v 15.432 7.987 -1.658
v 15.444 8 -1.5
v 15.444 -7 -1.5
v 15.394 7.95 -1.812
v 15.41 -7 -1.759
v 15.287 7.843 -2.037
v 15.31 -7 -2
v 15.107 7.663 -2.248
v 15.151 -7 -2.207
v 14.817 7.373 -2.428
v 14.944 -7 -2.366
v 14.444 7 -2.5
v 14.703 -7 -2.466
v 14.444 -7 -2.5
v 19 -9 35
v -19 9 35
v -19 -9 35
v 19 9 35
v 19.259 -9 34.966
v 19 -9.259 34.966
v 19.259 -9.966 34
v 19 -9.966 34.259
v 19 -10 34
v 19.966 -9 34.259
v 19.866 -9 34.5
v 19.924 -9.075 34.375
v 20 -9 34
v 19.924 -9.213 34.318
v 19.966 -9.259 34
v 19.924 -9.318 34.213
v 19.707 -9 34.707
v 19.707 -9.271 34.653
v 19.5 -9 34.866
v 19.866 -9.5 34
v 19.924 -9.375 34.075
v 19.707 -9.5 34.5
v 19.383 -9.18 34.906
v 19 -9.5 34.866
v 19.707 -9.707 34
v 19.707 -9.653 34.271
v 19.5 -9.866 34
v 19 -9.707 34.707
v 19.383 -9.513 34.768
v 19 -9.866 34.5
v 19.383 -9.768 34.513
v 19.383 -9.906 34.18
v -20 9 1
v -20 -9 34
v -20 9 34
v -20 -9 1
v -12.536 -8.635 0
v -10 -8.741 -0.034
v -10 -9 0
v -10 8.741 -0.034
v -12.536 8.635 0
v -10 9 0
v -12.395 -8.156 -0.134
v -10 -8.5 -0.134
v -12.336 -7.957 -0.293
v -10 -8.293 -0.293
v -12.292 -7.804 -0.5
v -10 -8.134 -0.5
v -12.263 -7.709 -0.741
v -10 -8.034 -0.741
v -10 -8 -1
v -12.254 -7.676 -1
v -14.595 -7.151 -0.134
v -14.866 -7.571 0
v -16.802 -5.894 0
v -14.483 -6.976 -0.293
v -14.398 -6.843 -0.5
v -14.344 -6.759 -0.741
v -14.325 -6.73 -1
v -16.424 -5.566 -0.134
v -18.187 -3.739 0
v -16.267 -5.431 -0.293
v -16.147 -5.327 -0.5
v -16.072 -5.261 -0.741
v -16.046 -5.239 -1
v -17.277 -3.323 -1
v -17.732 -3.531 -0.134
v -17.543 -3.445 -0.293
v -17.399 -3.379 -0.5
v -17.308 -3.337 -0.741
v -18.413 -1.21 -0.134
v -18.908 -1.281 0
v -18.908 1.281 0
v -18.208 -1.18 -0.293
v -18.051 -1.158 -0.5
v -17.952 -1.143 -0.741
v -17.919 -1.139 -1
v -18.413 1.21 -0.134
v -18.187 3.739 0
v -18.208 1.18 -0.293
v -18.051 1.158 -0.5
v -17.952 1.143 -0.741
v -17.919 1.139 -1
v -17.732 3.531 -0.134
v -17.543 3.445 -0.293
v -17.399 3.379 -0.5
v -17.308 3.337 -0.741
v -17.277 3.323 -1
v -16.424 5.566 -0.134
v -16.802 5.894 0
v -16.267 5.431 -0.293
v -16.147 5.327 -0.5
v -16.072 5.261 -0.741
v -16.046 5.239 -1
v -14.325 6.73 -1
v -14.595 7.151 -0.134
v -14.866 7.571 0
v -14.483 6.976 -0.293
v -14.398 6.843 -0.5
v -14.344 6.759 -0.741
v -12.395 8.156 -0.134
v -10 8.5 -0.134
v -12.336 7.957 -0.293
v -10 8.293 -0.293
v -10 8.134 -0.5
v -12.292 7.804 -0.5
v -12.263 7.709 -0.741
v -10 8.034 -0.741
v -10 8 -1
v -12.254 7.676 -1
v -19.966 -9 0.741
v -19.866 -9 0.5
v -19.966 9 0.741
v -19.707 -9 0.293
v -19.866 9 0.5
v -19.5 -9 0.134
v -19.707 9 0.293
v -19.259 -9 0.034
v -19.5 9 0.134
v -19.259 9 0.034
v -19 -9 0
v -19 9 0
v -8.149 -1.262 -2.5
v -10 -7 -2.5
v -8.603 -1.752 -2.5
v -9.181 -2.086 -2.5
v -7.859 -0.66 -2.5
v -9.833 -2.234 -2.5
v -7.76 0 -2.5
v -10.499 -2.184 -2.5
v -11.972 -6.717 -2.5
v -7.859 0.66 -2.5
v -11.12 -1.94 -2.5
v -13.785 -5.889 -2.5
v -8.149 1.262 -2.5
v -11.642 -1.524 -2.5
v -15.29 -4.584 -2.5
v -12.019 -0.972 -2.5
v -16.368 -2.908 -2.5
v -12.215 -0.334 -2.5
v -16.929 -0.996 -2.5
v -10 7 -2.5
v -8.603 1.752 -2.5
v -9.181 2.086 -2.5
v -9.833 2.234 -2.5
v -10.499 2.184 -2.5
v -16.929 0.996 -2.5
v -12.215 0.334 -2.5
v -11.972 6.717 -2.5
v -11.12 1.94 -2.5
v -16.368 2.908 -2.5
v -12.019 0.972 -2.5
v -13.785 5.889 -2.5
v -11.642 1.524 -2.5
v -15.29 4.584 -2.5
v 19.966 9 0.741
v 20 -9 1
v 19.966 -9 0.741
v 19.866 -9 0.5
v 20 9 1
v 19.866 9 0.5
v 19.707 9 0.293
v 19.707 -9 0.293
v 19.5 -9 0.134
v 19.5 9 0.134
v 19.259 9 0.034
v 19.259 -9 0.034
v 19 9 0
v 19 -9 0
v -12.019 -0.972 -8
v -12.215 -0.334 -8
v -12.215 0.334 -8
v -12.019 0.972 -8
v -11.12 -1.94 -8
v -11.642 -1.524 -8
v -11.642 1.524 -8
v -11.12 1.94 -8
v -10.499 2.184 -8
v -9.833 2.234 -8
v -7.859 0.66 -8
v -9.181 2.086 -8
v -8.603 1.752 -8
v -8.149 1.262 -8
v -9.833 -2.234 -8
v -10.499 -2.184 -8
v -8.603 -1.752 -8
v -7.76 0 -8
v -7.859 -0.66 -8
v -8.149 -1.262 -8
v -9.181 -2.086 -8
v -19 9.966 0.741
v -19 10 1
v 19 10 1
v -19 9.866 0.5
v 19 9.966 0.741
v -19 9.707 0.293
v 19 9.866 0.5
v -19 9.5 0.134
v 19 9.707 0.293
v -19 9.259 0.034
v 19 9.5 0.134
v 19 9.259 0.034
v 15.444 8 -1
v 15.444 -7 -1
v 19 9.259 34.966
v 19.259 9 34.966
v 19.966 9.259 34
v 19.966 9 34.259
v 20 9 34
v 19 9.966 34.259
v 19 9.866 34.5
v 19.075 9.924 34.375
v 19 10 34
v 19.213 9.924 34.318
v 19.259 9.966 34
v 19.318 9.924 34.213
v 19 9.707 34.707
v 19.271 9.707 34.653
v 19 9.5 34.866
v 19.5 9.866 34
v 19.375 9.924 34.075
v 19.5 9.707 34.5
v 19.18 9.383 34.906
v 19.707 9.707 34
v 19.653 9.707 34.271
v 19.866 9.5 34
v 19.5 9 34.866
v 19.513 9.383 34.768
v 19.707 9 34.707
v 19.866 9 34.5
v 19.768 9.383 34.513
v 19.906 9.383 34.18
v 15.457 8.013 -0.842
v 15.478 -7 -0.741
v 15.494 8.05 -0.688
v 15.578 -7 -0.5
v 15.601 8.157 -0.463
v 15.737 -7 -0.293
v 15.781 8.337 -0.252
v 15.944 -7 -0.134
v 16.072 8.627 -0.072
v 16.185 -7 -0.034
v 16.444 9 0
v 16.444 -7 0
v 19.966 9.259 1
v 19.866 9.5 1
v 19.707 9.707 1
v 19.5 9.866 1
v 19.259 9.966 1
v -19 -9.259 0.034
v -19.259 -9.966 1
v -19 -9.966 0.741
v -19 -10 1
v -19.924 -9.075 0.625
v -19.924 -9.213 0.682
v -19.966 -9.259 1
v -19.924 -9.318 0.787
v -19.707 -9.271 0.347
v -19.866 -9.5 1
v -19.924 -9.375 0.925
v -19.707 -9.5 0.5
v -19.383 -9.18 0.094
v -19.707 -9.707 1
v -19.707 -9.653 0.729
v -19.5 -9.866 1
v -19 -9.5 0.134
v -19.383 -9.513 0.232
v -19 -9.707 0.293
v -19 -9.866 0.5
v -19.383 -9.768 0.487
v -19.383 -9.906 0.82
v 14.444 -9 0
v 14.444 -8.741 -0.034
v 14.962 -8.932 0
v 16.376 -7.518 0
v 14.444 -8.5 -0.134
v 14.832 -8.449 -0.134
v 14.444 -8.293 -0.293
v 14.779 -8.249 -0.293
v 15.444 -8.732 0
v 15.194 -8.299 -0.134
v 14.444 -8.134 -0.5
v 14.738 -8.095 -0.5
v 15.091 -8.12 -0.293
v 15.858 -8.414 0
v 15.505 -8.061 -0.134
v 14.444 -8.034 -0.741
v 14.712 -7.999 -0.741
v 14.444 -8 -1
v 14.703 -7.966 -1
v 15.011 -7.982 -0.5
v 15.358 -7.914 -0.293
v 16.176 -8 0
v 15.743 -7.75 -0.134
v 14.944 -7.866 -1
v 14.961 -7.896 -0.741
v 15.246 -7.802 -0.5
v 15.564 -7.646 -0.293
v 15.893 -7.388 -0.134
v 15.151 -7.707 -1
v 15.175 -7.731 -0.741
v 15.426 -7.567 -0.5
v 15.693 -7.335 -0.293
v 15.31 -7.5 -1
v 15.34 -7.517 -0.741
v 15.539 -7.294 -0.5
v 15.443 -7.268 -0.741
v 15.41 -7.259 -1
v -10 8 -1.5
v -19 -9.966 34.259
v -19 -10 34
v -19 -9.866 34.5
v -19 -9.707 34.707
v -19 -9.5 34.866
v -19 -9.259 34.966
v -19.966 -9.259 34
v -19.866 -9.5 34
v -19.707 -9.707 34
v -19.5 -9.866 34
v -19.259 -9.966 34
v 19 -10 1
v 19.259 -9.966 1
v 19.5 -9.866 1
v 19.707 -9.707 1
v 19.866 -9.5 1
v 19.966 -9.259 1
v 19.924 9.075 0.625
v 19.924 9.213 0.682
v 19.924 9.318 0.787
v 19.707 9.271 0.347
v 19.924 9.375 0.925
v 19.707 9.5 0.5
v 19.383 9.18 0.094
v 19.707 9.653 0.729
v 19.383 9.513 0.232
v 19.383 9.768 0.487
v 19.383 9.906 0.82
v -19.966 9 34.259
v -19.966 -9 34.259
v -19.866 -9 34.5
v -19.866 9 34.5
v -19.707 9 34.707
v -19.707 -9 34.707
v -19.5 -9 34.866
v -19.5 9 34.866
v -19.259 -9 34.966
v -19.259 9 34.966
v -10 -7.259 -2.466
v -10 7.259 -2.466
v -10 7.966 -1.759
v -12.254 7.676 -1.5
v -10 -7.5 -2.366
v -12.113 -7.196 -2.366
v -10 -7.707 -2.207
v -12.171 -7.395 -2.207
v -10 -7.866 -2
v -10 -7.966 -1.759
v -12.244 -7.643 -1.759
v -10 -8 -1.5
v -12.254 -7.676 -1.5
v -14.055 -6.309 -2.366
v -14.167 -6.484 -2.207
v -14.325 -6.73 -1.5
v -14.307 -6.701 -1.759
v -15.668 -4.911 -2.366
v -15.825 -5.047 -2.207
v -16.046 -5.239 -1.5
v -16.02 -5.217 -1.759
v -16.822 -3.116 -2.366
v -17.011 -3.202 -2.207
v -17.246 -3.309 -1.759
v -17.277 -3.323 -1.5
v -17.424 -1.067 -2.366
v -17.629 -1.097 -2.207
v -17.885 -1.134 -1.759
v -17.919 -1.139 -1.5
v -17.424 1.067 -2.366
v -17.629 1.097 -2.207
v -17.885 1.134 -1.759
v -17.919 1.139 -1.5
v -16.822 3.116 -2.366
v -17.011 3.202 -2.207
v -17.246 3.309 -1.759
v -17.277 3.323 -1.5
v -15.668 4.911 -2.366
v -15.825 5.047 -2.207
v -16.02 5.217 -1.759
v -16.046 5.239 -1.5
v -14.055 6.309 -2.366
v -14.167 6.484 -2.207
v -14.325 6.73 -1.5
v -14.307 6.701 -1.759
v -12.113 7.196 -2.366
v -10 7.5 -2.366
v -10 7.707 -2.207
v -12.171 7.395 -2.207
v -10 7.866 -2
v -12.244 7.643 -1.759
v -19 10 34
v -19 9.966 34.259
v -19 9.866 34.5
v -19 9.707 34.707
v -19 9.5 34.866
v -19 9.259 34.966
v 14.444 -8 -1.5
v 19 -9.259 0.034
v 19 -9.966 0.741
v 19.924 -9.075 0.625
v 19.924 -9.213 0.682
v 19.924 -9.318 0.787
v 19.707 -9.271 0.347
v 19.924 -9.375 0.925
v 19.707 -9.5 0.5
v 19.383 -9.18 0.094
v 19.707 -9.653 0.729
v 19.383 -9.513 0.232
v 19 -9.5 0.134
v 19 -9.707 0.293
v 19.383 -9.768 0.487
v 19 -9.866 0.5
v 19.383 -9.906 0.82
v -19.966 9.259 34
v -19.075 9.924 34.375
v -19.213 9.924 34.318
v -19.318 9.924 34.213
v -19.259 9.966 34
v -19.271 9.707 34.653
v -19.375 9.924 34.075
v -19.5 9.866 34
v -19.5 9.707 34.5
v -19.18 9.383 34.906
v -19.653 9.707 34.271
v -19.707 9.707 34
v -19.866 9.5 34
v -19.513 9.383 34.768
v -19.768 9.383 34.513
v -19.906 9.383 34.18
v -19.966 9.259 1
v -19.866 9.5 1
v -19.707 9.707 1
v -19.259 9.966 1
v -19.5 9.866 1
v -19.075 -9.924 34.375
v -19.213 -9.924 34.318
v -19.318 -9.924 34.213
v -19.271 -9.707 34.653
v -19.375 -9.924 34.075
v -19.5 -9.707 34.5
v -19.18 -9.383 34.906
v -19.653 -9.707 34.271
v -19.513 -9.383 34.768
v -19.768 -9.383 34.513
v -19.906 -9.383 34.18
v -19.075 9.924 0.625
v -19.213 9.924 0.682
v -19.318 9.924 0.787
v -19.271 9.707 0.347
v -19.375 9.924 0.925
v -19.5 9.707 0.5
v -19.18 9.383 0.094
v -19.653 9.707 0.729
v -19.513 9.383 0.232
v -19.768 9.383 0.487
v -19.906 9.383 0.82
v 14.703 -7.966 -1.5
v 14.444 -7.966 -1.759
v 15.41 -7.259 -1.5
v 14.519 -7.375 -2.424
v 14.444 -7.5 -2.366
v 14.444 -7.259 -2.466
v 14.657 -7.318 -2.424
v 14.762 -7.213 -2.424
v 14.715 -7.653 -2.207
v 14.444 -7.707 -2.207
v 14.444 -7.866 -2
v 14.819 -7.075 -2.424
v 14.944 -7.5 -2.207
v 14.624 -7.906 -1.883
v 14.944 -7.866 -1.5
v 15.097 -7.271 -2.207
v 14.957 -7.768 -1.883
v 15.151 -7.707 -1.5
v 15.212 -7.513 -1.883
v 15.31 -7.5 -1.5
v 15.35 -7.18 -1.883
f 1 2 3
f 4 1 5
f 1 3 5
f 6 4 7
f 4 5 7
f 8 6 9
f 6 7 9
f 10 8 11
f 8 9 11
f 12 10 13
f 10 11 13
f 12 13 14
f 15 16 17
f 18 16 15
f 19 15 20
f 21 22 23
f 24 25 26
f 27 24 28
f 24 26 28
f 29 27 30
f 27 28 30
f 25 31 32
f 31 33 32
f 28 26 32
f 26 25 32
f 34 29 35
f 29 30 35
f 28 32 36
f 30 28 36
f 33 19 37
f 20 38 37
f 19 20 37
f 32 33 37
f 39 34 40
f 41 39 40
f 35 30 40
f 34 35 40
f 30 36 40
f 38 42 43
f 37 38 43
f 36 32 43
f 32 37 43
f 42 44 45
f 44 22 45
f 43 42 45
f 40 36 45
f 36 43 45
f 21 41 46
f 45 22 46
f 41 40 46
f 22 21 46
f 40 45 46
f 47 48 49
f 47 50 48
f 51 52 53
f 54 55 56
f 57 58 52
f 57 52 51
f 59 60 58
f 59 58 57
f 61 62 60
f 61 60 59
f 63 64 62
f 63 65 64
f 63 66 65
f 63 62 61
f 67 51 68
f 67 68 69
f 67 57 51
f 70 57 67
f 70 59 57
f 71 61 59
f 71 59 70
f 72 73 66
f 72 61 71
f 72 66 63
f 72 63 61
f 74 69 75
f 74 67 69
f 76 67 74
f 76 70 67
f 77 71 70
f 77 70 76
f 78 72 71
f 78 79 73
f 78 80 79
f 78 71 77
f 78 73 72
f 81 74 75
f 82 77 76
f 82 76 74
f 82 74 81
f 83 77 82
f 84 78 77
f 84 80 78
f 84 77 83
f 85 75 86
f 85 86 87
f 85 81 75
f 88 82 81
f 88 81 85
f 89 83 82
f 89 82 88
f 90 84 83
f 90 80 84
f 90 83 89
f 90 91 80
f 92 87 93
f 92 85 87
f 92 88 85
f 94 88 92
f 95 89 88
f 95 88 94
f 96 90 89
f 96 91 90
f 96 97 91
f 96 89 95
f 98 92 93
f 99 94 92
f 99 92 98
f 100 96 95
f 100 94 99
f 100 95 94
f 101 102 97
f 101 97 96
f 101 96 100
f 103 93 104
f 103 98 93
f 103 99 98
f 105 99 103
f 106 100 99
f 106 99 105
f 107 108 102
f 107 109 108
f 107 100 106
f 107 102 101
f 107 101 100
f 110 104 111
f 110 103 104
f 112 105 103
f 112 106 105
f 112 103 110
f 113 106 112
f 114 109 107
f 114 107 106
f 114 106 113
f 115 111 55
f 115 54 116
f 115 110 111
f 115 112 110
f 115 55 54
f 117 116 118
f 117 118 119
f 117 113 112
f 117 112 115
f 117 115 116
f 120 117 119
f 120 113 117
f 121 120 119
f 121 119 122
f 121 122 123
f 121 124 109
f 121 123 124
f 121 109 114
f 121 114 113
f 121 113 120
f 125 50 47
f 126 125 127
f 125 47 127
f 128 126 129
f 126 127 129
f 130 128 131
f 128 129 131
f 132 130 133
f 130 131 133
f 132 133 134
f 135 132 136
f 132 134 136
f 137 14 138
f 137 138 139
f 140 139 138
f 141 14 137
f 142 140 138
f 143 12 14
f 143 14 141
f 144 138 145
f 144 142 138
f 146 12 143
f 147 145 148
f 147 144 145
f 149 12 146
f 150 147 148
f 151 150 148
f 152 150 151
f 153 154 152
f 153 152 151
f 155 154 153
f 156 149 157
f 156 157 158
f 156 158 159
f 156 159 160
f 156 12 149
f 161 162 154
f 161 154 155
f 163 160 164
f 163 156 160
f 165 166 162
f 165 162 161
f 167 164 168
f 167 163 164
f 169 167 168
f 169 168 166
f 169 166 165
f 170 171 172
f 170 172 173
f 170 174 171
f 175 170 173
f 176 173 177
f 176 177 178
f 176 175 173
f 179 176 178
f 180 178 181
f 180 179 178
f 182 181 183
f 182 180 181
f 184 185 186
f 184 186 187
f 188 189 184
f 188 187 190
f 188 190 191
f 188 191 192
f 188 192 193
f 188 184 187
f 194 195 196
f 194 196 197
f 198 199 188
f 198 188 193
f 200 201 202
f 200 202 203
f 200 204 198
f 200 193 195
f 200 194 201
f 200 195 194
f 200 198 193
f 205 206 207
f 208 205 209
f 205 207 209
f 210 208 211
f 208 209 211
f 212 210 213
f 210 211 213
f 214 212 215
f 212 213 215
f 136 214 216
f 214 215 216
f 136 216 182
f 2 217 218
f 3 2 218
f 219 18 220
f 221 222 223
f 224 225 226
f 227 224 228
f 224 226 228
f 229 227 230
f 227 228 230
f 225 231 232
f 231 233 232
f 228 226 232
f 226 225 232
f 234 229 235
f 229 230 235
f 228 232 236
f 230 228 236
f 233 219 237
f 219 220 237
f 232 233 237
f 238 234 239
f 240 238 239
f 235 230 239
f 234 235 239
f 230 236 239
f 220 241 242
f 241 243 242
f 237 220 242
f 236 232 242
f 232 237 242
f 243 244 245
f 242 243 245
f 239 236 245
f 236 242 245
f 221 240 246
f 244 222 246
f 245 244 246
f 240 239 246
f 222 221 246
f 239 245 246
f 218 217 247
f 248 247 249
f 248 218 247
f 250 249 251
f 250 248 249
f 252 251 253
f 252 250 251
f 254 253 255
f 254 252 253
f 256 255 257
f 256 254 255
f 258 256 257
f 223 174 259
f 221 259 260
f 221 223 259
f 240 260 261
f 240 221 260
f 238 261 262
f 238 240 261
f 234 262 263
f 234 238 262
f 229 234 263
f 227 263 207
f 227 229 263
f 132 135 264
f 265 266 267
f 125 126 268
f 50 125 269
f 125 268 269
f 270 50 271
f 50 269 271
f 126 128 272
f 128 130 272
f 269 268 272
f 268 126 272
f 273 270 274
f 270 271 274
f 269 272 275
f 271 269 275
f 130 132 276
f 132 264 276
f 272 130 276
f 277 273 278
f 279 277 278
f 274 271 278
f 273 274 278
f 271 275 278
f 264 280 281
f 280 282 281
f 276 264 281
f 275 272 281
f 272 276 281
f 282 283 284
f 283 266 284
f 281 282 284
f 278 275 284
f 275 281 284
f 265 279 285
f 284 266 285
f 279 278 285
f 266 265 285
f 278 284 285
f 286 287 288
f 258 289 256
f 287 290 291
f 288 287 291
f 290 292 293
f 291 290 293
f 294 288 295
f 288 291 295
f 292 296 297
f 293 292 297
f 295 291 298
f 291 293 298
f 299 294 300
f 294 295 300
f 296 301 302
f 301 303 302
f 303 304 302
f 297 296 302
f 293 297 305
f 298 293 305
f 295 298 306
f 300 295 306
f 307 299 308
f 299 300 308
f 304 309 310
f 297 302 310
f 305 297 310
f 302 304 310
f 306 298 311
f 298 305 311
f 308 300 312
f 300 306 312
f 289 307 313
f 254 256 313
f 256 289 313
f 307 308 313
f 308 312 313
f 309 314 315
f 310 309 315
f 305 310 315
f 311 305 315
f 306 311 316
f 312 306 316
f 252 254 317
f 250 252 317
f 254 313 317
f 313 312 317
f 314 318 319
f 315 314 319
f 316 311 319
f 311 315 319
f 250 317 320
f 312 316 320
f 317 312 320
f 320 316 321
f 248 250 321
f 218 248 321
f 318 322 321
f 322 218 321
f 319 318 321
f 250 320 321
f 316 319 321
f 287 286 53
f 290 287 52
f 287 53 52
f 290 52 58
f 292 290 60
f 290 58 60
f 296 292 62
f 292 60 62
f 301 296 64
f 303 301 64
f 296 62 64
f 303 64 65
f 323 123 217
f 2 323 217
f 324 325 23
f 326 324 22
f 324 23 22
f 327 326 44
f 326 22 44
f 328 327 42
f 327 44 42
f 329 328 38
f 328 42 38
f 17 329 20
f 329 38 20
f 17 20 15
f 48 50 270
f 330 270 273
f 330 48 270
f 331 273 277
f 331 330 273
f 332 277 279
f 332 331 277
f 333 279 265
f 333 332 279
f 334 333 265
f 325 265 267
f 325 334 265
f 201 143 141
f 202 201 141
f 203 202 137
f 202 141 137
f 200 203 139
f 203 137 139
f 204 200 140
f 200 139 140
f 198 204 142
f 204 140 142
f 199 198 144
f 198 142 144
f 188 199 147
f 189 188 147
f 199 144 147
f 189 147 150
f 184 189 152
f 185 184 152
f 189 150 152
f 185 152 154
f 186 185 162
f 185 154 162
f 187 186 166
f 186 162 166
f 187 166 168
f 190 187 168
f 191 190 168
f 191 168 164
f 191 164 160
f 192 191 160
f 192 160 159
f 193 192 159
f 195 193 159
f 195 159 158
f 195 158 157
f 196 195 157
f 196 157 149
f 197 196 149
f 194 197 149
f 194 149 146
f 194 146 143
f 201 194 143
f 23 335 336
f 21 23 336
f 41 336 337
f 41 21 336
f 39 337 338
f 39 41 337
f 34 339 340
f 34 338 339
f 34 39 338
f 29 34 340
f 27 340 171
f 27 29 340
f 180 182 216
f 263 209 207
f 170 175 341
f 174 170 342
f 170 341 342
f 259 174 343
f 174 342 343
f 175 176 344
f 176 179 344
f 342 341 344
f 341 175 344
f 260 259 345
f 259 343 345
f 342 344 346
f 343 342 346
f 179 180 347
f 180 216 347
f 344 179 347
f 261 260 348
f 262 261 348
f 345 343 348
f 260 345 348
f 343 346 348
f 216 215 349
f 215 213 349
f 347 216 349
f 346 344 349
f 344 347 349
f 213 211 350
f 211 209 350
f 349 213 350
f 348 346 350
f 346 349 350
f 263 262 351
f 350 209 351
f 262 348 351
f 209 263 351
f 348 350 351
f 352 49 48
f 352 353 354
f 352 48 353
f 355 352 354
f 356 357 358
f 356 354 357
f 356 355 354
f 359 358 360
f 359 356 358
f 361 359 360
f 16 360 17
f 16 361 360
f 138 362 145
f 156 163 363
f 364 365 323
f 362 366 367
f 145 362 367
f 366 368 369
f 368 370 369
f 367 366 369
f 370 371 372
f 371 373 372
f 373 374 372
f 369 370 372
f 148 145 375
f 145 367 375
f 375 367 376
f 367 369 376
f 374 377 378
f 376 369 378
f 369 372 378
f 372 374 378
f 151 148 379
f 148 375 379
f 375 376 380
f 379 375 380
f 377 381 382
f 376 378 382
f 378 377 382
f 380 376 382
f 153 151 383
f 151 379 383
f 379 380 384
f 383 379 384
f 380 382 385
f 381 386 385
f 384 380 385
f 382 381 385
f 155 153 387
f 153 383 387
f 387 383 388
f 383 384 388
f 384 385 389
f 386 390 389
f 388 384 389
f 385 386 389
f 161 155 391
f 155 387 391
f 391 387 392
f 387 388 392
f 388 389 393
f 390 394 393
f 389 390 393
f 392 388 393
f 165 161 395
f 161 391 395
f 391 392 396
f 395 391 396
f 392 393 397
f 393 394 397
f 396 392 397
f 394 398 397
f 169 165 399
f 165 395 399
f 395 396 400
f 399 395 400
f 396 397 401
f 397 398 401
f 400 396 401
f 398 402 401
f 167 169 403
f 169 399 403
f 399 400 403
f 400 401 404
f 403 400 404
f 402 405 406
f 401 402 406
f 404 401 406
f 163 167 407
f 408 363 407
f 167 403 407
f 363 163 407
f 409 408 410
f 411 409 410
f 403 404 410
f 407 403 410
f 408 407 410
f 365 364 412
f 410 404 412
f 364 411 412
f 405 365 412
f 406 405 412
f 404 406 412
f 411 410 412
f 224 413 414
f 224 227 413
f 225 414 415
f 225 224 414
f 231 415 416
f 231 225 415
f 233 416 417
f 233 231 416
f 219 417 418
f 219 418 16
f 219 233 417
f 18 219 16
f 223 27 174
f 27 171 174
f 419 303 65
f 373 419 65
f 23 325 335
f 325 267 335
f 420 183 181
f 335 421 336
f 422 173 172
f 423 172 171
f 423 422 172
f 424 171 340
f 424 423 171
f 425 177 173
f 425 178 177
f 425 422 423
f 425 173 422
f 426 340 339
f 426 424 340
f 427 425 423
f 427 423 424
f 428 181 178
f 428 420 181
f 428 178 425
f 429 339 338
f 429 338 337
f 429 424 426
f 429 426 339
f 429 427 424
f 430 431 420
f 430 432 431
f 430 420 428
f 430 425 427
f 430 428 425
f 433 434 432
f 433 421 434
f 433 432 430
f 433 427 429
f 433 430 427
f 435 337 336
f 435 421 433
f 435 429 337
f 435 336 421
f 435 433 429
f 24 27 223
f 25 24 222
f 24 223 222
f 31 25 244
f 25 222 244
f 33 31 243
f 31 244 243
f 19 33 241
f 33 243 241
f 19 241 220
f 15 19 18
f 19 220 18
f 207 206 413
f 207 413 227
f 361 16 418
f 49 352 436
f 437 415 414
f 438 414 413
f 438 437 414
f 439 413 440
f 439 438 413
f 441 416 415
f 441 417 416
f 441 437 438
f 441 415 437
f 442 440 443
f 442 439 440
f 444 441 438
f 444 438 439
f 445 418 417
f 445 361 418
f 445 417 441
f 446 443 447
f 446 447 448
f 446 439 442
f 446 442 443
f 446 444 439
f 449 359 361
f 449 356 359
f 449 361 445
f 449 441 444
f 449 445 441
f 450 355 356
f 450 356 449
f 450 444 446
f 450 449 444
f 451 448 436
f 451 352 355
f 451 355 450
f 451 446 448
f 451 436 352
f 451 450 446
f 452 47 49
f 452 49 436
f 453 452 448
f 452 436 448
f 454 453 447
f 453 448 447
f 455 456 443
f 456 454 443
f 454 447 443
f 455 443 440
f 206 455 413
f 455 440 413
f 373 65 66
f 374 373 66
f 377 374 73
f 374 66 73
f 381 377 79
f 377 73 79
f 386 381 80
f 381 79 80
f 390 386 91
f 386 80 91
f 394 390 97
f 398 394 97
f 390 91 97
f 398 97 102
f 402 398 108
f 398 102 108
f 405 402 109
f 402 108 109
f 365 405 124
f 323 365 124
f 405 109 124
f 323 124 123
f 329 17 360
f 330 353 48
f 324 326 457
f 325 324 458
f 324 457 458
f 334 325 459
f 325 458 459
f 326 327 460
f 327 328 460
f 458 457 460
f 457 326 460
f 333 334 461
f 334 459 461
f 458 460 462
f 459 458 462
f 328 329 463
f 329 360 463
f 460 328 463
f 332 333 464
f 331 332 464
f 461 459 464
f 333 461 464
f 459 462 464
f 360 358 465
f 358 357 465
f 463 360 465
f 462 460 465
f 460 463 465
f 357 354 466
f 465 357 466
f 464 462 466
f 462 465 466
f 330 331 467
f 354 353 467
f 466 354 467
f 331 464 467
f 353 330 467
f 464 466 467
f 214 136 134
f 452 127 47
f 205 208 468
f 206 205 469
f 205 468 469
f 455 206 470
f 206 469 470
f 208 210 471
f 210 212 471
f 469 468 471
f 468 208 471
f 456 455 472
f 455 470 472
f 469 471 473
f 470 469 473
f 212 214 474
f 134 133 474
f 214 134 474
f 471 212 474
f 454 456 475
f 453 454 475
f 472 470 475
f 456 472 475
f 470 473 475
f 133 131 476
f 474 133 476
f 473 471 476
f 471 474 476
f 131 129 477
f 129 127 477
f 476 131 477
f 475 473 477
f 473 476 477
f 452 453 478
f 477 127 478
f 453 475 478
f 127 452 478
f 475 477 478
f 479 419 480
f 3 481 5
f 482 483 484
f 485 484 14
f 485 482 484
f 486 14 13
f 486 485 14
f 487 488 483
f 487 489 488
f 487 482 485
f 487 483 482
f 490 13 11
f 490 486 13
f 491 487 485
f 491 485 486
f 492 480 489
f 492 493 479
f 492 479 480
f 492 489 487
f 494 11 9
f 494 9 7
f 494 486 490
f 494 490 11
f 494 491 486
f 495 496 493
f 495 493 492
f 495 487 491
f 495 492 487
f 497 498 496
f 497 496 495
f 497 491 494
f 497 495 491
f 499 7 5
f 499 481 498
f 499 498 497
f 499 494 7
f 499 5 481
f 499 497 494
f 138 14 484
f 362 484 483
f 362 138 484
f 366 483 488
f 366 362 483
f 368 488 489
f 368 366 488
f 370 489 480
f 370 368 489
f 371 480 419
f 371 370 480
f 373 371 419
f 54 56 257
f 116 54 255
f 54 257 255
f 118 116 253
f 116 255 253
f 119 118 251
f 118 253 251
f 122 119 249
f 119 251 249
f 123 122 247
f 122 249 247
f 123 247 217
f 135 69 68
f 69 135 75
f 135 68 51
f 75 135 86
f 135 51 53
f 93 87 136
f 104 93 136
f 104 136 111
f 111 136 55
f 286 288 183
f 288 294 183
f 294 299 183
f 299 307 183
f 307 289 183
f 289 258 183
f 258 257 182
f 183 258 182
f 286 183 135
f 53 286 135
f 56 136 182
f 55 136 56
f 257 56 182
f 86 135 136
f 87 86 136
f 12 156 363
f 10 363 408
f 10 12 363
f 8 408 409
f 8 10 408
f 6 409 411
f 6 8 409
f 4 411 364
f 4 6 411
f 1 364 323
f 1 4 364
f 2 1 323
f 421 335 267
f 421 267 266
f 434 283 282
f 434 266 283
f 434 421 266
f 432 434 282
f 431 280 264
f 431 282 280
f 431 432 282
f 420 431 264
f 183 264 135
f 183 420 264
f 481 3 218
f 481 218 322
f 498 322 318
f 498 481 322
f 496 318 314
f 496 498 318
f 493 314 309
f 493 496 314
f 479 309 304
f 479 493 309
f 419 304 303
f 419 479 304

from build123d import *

# Parameters (mm, degrees)
SKETCH_1_W      = 40
SKETCH_1_H      = 20
EXTRUDE_1_DEPTH = 35
FILLET_1_R      = 1
SKETCH_2_R      = 2.240395976
EXTRUDE_2_DEPTH = 8
EXTRUDE_3_DEPTH = 2.5
FILLET_2_R      = 1


with BuildPart() as part:
    # 草图1 → 凸台-拉伸1 (new body)
    with BuildSketch(Plane.XY):
        Rectangle(SKETCH_1_W, SKETCH_1_H)
    extrude(amount=EXTRUDE_1_DEPTH)

    # 圆角1
    fillet_1_edges = [part.edges().sort_by_distance(p)[0] for p in [
        (-20, 0, 35),
        (0, -10, 35),
        (20, 0, 35),
        (0, -10, 0),
        (-20, 0, 0),
        (0, 10, 0),
        (20, 0, 0),
        (0, 10, 35),
        (20, -10, 17.5),
        (-20, -10, 17.5),
        (-20, 10, 17.5),
        (20, 10, 17.5),
    ]]
    fillet(fillet_1_edges, radius=FILLET_1_R)

    # 草图2 → 凸台-拉伸2 (add)
    with BuildSketch(Plane(origin=(0, 0, 0), x_dir=(-1, 0, 0), z_dir=(0, 0, -1))):
        with Locations(Location((10, 0, 0), (0, 0, 180))):
            Circle(SKETCH_2_R)
    extrude(amount=EXTRUDE_2_DEPTH)

    # 草图3 → 凸台-拉伸3 (add)
    with BuildSketch(Plane(origin=(0, 0, 0), x_dir=(-1, 0, 0), z_dir=(0, 0, -1))):
        with BuildLine():
            Line((-15.444071046, 8), (-15.444071046, -8))
            Line((-15.444071046, -8), (10, -8))
            ThreePointArc((10, -8), (18, 0), (10, 8))
            Line((10, 8), (-15.444071046, 8))
        make_face()
    extrude(amount=EXTRUDE_3_DEPTH)

    # 圆角2
    fillet_2_edges = [part.edges().sort_by_distance(p)[0] for p in [
        (-18, 0, 0),
        (2.722035523, 8, 0),
        (15.444071046, 0, 0),
        (2.722035523, -8, 0),
        (15.444071046, -8, -1.25),
        (-18, 0, -2.5),
        (2.722035523, 8, -2.5),
        (15.444071046, 0, -2.5),
        (2.722035523, -8, -2.5),
    ]]
    fillet(fillet_2_edges, radius=FILLET_2_R - 0.0001)  # a hair under: the kernel refuses the full size


solid = part.part
